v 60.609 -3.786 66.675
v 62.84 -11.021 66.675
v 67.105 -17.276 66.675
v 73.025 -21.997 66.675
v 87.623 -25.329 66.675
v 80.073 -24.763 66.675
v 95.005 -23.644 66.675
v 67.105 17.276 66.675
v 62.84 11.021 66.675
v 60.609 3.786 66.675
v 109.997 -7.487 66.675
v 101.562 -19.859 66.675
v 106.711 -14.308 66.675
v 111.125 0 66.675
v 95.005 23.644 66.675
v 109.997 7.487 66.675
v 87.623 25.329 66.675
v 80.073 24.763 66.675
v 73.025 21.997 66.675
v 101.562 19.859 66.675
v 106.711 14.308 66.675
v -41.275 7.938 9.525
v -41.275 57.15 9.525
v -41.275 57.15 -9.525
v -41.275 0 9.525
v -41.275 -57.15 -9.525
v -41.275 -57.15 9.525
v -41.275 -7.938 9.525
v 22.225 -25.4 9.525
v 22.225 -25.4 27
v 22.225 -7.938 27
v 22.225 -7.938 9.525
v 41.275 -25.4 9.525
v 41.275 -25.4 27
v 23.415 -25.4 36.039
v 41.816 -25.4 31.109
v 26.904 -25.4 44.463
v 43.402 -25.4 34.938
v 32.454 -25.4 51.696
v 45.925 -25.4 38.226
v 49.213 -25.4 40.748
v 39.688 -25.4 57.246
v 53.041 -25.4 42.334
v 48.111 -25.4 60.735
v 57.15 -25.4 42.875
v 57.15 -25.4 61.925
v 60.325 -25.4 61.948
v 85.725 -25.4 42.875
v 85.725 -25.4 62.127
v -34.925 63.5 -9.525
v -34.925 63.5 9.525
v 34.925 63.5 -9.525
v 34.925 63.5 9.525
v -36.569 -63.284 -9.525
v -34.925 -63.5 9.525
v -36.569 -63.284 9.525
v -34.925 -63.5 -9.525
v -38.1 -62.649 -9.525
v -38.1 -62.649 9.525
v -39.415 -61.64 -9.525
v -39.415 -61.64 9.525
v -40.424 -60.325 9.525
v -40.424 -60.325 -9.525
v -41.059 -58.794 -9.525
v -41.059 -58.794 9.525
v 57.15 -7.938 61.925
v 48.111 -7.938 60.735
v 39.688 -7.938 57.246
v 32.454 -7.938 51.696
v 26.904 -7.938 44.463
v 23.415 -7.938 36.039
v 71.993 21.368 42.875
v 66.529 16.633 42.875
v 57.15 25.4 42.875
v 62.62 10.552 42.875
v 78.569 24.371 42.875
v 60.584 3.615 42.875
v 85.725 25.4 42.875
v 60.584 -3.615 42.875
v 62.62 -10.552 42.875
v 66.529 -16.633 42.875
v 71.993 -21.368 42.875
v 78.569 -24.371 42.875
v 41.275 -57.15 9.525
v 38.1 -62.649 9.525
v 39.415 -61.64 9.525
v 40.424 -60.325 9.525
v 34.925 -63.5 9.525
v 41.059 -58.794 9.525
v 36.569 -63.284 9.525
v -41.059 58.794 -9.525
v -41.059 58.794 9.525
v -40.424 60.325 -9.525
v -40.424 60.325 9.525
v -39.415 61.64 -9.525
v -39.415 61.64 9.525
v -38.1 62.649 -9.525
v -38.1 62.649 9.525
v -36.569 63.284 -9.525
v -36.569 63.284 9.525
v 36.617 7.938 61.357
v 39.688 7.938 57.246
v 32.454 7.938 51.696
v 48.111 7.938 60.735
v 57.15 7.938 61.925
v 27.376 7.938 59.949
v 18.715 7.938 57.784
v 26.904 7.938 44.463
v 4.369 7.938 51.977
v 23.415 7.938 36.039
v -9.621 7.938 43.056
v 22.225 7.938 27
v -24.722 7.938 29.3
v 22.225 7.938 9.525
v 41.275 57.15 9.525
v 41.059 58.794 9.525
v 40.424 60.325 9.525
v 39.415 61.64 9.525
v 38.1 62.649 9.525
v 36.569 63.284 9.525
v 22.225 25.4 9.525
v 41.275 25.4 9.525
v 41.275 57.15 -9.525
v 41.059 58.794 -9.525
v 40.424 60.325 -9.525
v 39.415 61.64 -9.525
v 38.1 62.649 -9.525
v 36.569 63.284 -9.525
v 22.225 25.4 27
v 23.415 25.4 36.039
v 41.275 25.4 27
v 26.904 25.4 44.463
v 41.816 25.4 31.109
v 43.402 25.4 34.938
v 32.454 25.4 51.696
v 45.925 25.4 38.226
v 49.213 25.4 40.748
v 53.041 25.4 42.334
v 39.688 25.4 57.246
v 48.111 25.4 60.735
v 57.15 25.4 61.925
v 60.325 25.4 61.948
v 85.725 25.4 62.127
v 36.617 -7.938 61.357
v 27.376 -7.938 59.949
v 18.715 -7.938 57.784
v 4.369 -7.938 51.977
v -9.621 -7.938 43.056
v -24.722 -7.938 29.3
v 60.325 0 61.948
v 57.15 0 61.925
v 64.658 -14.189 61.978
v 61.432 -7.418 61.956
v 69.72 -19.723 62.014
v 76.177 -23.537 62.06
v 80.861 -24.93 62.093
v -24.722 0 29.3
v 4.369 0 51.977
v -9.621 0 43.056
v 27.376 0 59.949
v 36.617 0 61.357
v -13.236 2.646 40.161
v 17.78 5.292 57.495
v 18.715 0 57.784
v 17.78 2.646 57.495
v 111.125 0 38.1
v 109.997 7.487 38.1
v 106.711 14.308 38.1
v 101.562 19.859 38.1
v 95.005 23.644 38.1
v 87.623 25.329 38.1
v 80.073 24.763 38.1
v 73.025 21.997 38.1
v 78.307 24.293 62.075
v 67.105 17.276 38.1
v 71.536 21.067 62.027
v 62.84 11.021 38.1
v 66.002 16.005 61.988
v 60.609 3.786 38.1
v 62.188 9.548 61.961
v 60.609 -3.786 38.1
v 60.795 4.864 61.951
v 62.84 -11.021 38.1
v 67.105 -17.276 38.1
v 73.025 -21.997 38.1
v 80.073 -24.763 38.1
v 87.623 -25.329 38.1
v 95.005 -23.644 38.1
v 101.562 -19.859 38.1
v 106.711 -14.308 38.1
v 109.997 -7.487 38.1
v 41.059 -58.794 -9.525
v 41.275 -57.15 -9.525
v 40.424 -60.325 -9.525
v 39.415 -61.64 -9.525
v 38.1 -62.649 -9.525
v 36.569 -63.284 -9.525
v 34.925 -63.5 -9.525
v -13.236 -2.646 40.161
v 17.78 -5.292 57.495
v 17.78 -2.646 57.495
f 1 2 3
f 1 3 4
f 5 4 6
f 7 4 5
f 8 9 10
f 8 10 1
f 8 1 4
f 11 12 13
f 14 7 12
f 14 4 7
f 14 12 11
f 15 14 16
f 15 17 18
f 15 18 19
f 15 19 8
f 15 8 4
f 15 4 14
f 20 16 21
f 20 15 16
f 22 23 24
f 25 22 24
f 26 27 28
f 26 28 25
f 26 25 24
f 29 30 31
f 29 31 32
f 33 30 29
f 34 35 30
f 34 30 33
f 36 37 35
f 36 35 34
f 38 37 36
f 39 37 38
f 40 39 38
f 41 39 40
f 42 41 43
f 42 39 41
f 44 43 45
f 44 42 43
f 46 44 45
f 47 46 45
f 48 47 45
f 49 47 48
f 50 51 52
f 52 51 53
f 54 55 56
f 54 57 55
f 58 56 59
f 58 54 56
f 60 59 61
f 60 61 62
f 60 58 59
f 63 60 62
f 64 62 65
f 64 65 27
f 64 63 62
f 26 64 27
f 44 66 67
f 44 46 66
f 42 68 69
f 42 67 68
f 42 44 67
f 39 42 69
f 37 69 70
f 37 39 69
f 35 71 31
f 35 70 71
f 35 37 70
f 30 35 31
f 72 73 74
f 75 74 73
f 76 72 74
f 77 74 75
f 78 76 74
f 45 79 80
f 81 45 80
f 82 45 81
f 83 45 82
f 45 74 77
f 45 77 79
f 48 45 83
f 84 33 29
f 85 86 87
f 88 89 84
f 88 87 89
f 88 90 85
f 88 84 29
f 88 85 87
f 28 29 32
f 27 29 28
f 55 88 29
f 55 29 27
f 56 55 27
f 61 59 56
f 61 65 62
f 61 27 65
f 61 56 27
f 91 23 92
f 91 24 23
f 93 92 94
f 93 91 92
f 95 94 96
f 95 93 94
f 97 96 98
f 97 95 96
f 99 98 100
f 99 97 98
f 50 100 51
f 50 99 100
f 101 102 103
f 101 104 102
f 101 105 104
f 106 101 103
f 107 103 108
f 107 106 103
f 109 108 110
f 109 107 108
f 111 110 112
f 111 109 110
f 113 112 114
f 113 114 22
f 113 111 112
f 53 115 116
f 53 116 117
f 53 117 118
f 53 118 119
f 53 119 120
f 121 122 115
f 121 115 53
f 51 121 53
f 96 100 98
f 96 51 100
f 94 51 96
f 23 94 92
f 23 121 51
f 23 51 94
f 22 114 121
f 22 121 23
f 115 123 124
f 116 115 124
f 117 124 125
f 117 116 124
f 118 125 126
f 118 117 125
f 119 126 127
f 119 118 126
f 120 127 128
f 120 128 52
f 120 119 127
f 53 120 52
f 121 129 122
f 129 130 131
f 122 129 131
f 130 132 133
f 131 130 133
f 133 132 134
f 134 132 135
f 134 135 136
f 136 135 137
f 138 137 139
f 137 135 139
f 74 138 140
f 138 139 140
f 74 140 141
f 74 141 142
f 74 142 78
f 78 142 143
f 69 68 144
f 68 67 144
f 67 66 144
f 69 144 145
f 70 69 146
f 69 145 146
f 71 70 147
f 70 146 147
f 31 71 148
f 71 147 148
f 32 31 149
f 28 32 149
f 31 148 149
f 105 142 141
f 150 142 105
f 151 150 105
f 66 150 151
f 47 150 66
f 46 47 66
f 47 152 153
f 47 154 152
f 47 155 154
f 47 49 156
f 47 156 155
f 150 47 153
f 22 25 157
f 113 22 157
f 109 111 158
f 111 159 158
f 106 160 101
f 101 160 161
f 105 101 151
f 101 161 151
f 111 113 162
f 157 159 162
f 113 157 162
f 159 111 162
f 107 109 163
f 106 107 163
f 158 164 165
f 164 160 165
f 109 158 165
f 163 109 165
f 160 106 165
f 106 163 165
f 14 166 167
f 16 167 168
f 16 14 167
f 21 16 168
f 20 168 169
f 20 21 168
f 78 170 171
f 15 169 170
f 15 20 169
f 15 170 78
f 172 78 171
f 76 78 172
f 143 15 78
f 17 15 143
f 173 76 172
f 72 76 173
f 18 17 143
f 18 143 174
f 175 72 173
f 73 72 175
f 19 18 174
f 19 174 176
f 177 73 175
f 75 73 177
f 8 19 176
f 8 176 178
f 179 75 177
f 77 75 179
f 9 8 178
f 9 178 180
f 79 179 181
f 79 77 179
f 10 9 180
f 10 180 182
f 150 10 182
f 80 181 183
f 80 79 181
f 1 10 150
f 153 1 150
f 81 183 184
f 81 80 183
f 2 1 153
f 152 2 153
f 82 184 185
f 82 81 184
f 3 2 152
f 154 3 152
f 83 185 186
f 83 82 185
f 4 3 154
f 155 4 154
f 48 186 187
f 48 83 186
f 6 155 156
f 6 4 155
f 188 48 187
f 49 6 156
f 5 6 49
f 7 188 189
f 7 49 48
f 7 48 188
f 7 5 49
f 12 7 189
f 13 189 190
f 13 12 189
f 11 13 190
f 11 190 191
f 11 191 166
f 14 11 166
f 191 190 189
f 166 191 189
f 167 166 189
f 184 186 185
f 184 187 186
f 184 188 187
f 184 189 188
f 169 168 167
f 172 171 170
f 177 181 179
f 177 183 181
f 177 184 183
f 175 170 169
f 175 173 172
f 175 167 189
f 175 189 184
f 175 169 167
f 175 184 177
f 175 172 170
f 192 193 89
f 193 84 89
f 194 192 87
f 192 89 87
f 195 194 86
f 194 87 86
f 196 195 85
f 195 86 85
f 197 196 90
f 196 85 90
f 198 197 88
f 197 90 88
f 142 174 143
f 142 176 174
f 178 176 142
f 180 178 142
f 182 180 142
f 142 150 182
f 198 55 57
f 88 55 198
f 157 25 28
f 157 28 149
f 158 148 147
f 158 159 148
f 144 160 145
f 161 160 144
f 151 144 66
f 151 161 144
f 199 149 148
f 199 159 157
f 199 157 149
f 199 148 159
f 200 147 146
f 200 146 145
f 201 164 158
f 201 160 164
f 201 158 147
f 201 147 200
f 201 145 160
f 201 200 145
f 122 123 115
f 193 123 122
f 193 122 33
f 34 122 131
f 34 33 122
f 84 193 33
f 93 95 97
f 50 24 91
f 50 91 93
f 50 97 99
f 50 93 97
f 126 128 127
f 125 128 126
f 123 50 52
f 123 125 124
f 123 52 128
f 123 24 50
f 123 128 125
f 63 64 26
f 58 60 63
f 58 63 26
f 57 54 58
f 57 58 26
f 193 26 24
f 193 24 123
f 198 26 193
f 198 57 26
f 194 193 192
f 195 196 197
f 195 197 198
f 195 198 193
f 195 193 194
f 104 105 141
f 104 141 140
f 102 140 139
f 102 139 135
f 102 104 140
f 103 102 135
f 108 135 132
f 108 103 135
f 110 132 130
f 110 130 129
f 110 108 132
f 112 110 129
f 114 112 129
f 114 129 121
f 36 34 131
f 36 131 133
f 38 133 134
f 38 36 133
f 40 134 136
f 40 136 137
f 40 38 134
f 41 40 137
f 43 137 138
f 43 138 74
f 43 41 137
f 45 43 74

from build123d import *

# Parameters (mm, degrees)
F1_DEPTH = 63.5
F2_DEPTH = 25.4
F3_DEPTH = 7.9375
F0_W     = 25.4
F0_H     = 4.7752
F5_R     = 6.35


with BuildPart() as f1:
    # F0 (on Front) → F1 (new body, symmetric)
    with BuildSketch(Plane.XZ):
        Polygon((22.225, 9.525), (-41.275, 9.525), (-41.275, -9.525), (41.275, -9.525), (41.275, 9.525), align=None)
    extrude(amount=F1_DEPTH, both=True)

    # F0 (on Front) → F2 (join, symmetric)
    with BuildSketch(Plane.XZ):
        with BuildLine():
            Line((22.225, 27.0002), (22.225, 9.525))
            Line((22.225, 9.525), (41.275, 9.525))
            Line((41.275, 9.525), (41.275, 27.0002))
            ThreePointArc((41.275, 27.0002), (45.9246798487, 38.2255201513), (57.15, 42.8752))
            Line((57.15, 42.8752), (60.325, 42.8752))
            Line((60.325, 42.8752), (60.325, 61.9476745522))
            Line((60.325, 61.9476745522), (57.15, 61.9252))
            ThreePointArc((57.15, 61.9252), (32.4542956671, 51.6959043329), (22.225, 27.0002))
        make_face()
        Polygon((85.725, 62.1274709702), (60.325, 61.9476745522), (60.325, 42.8752), (85.725, 42.8752), align=None)
    extrude(amount=F2_DEPTH, both=True)

    # F0 (on Front) → F3 (join, symmetric)
    with BuildSketch(Plane.XZ):
        with BuildLine():
            add(Edge.make_bspline(
                [(-41.275, 9.525), (-12.9327131435, 46.9444841146), (11.8099329993, 63.8144686818), (57.15, 61.9252)],
                knots=[0, 0, 0, 0, 111.5045361635, 111.5045361635, 111.5045361635, 111.5045361635], degree=3))
            Line((-41.275, 9.525), (22.225, 9.525))
            Line((22.225, 9.525), (22.225, 27.0002))
            ThreePointArc((22.225, 27.0002), (32.4542956671, 51.6959043329), (57.15, 61.9252))
        make_face()
    extrude(amount=F3_DEPTH, both=True)

    # F0 (on Front) → F4 (revolve)
    with BuildSketch(Plane.XZ):
        Polygon((85.725, 66.675), (85.725, 62.1274709702), (85.725, 42.8752), (111.125, 42.8752), (111.125, 66.675), align=None)
        with Locations((98.425, 40.4876)):
            Rectangle(F0_W, F0_H)
    revolve(axis=Axis((85.725, 0, 52.3875), (0, 0, 1)))

    # F5
    f5_edges = [f1.edges().sort_by_distance(p)[0] for p in [
        (-41.275, -63.5, 0),
        (41.275, -63.5, 0),
        (41.275, 63.5, 0),
        (-41.275, 63.5, 0),
    ]]
    fillet(f5_edges, radius=F5_R)


solid = f1.part
